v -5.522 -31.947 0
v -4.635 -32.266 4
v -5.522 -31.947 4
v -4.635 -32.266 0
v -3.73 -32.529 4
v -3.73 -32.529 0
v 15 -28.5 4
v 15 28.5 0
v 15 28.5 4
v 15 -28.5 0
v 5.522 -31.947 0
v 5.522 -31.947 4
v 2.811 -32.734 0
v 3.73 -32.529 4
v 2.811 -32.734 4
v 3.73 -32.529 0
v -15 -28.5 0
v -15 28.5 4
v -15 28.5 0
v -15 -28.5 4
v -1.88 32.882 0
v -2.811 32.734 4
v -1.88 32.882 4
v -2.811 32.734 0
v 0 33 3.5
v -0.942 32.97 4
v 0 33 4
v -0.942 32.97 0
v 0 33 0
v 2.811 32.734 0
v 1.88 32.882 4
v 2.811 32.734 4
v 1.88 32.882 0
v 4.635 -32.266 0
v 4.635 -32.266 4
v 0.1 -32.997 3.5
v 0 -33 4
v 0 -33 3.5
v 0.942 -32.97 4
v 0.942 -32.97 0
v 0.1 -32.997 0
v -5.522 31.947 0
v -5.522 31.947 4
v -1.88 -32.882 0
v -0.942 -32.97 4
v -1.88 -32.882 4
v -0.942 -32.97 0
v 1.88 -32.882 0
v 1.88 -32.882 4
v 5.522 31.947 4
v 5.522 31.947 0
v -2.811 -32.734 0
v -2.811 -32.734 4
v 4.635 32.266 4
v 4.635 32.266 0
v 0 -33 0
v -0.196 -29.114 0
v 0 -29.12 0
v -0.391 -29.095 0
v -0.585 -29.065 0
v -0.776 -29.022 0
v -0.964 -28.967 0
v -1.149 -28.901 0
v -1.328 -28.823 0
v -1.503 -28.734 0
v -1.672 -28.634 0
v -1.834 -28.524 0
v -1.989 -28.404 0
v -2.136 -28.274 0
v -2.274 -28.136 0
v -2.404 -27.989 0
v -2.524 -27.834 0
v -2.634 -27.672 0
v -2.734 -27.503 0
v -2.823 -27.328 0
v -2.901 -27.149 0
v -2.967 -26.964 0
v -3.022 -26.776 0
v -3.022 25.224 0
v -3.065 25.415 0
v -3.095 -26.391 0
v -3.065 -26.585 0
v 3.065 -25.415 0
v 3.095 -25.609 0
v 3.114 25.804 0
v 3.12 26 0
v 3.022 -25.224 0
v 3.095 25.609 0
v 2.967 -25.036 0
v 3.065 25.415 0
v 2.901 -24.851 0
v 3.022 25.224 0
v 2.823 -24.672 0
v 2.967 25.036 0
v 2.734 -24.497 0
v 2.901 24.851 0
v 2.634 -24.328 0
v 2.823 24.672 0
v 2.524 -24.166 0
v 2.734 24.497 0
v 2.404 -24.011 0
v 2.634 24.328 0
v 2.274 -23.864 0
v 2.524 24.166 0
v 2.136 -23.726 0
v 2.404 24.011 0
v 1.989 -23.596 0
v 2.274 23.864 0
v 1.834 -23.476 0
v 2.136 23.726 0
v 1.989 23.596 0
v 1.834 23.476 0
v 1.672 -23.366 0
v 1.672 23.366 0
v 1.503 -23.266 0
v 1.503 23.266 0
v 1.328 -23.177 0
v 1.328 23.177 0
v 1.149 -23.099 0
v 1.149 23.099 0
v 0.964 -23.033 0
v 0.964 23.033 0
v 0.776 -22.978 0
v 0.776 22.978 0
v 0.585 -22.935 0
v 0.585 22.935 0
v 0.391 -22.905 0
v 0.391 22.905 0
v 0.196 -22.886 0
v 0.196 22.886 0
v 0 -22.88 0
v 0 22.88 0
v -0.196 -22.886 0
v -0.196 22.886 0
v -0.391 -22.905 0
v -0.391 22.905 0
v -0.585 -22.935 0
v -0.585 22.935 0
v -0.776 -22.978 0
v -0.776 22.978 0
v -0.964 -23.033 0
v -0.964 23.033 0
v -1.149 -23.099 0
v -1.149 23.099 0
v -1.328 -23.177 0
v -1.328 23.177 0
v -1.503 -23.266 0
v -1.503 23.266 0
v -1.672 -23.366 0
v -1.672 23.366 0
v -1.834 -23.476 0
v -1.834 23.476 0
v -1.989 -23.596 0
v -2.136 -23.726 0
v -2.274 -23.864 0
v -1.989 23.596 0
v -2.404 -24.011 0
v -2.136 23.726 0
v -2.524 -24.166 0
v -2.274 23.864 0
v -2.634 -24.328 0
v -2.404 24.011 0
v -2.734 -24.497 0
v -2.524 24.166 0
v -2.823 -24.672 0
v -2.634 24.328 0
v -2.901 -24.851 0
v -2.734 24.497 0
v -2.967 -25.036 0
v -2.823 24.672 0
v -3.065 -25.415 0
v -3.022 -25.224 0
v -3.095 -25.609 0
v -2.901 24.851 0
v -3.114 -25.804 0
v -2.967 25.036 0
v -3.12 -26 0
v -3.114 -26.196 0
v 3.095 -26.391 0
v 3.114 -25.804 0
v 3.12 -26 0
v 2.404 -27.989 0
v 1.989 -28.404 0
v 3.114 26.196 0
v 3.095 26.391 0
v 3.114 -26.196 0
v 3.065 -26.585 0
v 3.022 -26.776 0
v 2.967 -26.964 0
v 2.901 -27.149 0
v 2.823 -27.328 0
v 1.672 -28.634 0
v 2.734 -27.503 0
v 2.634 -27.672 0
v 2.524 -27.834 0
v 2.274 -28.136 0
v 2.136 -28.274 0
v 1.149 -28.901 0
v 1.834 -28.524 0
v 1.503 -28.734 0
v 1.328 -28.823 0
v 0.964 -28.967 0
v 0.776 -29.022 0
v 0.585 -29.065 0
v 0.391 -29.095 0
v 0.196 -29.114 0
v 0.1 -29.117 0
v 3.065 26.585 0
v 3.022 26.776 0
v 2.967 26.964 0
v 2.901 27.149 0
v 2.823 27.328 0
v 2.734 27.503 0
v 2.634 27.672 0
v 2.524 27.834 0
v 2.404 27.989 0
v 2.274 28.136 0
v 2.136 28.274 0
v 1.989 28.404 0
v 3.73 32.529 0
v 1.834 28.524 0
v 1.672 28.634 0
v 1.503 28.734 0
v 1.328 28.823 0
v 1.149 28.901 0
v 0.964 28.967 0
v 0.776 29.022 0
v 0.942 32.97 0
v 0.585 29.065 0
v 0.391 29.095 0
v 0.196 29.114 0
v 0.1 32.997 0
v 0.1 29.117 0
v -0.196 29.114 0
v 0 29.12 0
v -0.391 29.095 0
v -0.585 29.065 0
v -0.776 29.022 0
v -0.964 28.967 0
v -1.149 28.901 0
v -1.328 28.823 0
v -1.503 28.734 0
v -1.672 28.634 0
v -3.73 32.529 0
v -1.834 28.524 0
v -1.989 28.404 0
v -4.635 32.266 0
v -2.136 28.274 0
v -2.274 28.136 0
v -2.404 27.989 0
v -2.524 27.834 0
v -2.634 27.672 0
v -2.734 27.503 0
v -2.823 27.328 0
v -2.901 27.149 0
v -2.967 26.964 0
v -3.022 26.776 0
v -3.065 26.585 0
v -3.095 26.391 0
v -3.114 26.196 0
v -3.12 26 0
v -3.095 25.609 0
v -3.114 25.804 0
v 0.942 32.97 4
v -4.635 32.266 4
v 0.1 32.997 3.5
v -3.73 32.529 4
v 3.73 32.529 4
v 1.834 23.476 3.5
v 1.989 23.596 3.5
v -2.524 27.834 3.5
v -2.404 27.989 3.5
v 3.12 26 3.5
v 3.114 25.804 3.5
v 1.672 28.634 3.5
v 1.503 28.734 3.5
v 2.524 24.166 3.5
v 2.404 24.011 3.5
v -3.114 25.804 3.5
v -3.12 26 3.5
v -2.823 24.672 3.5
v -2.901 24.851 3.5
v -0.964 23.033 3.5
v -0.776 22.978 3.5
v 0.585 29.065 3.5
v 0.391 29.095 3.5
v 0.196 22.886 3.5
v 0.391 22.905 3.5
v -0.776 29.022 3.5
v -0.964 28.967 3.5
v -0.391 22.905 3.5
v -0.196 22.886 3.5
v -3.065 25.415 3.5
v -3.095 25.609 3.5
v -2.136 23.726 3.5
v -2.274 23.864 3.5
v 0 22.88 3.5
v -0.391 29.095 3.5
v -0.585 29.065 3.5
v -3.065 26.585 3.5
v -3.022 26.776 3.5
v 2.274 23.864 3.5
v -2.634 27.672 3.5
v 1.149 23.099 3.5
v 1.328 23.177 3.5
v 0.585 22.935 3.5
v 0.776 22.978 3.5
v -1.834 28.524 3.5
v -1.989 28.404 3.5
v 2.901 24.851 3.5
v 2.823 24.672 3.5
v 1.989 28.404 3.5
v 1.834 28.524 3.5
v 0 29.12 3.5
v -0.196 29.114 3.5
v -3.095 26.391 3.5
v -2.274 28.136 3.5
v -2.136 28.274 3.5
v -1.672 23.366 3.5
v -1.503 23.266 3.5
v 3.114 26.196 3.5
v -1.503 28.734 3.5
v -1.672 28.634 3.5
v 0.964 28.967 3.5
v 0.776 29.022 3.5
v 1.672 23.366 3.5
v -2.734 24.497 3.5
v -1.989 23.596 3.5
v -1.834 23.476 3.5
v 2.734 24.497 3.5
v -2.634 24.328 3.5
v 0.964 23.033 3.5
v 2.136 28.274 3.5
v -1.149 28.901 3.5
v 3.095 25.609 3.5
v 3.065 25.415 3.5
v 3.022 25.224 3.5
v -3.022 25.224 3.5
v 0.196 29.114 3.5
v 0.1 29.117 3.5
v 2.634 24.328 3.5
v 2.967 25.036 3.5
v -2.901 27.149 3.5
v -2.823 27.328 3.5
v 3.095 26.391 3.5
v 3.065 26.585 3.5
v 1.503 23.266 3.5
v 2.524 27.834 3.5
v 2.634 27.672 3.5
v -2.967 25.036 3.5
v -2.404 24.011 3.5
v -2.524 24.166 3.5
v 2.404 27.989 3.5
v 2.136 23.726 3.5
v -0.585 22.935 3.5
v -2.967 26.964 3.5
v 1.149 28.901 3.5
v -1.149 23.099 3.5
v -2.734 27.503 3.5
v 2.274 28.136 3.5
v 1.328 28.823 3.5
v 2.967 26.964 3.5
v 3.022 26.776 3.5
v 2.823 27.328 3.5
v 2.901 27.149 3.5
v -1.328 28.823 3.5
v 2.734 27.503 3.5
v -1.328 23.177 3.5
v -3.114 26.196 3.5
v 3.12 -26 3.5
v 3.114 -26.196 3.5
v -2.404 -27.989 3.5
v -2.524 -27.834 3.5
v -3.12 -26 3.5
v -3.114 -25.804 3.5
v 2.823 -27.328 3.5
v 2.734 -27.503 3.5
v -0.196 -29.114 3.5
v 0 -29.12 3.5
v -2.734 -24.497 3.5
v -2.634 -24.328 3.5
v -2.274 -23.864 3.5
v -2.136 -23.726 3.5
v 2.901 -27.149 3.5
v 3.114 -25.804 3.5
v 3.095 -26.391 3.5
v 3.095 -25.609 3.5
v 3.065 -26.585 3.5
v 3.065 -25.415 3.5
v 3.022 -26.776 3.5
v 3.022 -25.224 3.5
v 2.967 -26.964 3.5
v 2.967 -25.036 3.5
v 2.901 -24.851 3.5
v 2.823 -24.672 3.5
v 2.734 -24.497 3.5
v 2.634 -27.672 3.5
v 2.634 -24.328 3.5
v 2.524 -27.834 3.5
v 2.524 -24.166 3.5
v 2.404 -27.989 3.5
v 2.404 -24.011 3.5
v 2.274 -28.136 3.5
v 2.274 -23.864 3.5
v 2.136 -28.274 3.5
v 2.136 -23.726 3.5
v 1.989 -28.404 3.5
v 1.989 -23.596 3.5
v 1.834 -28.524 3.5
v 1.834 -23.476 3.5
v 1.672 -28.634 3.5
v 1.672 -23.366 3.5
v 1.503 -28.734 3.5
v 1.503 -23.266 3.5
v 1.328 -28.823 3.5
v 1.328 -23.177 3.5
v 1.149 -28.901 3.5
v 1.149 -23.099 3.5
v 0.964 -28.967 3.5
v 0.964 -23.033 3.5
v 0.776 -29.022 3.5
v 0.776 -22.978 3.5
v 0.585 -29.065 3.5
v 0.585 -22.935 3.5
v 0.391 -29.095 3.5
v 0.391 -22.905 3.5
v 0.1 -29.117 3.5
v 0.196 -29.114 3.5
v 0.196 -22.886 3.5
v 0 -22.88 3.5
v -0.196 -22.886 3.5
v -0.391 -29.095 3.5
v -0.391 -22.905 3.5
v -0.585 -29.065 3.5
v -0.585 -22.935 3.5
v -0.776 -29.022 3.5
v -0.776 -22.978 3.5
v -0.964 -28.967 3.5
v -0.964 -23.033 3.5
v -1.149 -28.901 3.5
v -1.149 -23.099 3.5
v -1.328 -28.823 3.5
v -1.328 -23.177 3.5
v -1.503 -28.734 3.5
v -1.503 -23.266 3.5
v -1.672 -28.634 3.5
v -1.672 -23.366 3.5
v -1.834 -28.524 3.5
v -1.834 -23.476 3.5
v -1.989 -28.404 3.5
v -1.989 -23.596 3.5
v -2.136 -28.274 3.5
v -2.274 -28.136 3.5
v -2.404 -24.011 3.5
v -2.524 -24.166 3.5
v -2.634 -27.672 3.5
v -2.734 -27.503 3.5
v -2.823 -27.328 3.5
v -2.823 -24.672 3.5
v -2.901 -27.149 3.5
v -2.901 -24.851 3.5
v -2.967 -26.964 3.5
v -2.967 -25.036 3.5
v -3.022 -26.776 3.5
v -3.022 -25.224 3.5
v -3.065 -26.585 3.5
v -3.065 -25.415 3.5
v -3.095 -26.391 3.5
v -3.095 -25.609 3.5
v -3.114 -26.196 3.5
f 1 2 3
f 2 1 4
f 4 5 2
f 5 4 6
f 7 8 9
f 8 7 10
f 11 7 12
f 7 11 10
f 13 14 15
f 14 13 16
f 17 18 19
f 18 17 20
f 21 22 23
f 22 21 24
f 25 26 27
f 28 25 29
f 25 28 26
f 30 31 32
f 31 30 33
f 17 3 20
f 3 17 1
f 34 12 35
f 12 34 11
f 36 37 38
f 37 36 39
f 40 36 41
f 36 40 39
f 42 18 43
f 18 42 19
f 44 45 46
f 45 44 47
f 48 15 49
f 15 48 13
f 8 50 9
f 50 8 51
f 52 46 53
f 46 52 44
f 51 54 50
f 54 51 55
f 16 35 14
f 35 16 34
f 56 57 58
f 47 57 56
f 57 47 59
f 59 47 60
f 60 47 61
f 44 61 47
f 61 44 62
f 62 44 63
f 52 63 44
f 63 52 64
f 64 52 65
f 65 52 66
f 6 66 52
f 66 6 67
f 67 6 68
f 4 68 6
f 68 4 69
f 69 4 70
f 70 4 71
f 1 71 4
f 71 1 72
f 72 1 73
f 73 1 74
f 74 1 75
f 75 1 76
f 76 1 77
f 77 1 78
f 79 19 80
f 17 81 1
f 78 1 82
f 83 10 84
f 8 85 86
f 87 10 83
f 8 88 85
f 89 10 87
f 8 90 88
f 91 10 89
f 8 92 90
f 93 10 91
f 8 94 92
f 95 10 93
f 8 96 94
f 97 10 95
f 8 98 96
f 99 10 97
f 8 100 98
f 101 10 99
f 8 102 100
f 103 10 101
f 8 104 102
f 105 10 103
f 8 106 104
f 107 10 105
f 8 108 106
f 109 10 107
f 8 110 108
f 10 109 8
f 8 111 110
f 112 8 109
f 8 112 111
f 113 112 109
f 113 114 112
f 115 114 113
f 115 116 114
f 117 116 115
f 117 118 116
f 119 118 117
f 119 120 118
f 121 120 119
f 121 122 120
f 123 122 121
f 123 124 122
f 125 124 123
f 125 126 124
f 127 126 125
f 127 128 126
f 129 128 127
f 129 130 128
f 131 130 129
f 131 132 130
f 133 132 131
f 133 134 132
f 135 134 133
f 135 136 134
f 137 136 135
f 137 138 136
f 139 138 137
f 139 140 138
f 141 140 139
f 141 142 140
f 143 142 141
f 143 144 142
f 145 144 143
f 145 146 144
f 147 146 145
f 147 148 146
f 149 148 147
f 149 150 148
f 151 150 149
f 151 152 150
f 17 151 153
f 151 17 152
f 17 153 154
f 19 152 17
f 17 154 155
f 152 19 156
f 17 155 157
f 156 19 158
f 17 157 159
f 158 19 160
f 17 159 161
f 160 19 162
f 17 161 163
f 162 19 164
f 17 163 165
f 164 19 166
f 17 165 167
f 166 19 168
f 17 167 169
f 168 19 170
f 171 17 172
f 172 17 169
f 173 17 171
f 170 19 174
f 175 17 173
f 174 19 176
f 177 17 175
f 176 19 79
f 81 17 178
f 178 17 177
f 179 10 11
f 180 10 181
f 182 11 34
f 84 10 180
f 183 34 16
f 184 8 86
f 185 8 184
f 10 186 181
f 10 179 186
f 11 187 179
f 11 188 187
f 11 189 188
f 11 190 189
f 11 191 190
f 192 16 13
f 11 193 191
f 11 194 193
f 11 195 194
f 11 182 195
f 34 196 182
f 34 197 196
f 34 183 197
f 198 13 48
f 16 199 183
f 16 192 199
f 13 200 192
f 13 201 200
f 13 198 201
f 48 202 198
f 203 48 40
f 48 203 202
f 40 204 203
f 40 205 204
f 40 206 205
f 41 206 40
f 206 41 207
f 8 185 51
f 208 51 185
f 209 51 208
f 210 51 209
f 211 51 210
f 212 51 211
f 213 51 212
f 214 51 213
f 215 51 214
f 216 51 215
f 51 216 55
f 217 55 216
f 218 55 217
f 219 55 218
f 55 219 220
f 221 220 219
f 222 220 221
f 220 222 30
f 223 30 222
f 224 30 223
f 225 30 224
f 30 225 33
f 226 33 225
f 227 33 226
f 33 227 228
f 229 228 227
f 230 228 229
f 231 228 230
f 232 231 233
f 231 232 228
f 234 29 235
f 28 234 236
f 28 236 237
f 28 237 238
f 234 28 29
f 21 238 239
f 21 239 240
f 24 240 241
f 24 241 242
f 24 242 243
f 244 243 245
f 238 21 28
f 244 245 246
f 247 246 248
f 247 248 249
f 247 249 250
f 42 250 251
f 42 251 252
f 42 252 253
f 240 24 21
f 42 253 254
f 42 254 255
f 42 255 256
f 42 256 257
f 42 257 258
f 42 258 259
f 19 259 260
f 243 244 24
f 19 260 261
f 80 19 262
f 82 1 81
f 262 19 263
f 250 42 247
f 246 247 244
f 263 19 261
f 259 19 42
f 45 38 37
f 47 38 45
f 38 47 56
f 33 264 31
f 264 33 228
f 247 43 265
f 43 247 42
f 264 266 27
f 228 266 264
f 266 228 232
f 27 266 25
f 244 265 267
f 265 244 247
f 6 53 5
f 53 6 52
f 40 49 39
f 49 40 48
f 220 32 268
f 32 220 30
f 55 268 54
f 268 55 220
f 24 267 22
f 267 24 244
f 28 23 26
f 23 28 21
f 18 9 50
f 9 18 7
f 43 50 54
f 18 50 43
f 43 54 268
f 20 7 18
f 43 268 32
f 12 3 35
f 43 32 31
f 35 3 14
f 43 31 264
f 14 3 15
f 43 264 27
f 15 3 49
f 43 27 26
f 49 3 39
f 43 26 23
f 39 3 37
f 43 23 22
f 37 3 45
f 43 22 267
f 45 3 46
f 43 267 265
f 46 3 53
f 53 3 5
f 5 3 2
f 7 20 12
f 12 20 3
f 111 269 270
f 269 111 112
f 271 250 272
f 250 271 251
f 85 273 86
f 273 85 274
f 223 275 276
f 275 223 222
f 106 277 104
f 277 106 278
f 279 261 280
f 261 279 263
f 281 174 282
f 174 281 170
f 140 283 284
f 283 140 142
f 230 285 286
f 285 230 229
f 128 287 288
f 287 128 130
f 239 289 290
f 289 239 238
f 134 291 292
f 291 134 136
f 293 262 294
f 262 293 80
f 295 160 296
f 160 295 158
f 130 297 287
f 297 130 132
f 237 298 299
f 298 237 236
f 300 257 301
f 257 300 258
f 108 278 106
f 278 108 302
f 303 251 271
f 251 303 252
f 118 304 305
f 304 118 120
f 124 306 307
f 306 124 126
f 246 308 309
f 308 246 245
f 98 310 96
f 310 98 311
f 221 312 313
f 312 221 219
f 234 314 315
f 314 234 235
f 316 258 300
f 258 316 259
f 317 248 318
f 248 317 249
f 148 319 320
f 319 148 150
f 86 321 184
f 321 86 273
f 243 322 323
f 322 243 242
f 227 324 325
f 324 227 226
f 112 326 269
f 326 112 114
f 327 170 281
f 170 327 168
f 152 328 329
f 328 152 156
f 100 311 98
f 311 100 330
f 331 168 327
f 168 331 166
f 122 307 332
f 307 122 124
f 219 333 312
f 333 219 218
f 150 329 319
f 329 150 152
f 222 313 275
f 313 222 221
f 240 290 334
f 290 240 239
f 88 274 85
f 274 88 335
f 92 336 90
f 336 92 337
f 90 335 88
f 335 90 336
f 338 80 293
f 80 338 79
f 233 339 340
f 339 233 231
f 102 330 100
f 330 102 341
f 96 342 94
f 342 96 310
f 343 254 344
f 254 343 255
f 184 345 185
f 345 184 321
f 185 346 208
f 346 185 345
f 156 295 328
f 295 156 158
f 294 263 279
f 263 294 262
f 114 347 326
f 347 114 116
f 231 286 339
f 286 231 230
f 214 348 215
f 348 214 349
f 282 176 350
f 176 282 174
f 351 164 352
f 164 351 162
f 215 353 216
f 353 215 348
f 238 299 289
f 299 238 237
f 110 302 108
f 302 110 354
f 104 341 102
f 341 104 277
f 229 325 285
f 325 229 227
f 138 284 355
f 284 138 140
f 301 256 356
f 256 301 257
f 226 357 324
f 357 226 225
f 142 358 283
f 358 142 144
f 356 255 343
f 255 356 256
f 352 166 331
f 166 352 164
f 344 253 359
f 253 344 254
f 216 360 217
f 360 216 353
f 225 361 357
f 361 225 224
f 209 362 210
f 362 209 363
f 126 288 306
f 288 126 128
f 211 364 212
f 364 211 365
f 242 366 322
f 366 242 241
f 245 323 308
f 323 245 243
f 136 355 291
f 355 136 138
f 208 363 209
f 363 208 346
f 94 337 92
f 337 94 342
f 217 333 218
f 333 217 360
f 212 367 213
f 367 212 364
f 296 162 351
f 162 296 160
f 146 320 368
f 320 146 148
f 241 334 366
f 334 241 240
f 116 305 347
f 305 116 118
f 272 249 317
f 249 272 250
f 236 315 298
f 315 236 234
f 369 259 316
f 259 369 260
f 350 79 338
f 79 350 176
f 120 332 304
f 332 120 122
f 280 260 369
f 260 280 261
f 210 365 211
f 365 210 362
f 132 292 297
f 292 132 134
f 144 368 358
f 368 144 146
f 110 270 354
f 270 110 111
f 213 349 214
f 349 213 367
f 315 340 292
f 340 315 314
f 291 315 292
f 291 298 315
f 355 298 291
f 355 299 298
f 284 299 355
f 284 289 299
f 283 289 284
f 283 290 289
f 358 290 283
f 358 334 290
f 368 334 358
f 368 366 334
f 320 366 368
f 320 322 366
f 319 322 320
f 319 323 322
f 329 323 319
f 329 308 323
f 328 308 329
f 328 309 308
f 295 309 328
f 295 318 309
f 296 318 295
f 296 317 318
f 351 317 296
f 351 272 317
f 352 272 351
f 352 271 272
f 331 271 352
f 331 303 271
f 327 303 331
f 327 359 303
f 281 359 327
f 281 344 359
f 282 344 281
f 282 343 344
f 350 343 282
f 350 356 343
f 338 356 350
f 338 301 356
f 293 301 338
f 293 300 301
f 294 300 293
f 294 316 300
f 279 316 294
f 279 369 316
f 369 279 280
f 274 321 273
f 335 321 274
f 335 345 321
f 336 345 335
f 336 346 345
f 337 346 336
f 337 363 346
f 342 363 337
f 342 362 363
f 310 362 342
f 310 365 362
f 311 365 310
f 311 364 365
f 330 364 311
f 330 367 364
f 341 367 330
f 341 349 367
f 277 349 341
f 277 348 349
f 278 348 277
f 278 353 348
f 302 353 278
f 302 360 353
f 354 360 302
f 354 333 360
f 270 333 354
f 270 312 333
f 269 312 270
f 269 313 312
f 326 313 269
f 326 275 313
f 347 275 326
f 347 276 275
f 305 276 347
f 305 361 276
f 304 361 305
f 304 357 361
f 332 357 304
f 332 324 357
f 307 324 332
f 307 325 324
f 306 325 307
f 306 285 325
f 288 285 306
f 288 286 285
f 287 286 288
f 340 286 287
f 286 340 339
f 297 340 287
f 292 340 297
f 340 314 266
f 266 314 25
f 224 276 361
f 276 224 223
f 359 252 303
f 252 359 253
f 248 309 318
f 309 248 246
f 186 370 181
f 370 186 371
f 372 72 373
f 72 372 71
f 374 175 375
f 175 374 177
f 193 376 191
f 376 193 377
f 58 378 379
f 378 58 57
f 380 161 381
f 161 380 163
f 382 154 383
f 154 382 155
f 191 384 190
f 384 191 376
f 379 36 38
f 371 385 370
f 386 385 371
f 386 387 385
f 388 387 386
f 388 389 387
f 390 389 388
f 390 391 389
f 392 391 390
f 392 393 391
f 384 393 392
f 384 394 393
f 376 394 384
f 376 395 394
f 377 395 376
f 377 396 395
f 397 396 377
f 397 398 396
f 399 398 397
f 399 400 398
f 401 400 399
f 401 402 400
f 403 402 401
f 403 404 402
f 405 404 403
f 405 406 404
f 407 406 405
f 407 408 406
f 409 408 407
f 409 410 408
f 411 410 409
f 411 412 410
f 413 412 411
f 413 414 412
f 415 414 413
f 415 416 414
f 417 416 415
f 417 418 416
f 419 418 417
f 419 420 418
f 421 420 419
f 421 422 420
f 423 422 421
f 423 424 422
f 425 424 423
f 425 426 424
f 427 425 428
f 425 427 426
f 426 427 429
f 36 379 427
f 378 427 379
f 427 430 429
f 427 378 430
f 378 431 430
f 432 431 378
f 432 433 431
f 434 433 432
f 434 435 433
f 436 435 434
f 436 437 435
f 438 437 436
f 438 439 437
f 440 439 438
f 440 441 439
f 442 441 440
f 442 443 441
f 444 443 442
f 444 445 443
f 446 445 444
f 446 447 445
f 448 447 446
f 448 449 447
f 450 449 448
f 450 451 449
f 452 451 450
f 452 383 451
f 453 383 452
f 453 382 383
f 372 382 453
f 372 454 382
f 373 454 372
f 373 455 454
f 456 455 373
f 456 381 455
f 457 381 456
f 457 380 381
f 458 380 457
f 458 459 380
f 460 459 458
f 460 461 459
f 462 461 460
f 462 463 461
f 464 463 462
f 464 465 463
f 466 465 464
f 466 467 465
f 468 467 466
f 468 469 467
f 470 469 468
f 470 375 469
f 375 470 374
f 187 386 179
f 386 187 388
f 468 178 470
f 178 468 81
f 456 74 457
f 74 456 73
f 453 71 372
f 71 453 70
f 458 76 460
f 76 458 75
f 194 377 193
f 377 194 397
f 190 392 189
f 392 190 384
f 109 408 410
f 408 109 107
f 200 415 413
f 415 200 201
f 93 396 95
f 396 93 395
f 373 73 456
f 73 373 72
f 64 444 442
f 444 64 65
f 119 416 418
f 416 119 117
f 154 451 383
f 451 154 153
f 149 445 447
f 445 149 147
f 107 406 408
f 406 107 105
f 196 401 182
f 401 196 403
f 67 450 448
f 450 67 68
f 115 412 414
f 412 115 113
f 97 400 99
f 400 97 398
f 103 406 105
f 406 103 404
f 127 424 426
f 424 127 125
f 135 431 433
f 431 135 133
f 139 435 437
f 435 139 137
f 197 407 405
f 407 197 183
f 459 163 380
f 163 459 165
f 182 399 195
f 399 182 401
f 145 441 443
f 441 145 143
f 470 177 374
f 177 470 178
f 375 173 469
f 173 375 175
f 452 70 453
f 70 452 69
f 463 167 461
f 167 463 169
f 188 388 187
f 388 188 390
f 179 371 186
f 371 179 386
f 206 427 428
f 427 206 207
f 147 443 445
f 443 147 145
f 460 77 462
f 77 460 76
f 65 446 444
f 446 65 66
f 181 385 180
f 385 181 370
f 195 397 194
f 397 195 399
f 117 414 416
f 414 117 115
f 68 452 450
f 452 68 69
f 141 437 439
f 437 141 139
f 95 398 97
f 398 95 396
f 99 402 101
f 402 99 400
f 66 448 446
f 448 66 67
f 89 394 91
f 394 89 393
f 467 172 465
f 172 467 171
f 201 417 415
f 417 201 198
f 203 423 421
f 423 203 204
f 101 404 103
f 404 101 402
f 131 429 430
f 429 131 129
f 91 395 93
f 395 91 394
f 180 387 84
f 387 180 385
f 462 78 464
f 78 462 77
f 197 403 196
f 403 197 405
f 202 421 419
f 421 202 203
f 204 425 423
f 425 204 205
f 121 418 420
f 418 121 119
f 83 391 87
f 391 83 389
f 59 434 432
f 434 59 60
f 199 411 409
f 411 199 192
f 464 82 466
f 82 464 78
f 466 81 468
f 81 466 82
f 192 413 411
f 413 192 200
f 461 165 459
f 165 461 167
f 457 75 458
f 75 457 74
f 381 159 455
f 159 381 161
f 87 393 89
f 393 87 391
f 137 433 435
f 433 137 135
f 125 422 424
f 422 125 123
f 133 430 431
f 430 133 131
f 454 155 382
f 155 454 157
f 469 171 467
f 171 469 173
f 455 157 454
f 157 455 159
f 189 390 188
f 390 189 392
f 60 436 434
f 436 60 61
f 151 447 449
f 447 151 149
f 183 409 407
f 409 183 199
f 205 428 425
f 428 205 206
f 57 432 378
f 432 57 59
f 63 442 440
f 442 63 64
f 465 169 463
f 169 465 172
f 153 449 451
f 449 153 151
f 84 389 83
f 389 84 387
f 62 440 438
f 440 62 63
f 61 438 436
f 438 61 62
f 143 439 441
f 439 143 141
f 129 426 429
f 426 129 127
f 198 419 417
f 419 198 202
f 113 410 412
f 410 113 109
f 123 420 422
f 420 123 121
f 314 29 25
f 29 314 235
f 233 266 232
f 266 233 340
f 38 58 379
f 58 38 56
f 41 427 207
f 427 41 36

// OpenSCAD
difference(){
    linear_extrude(4) hull(){
        square([30,57],center=true);
        translate([0,18,0]) circle(15,$fn=100);
        translate([0,-18,0]) circle(15,$fn=100);
    }
    // 磁石穴
    translate([0,26,0]) linear_extrude(3.5) circle(3.12,$fn=100);
    translate([0,-26,0]) linear_extrude(3.5) circle(3.12,$fn=100);
    // 溝
    translate([0,29,0]) linear_extrude(3.5) square([0.1,4]);
    translate([0,-33,0]) linear_extrude(3.5) square([0.1,4]);
}
